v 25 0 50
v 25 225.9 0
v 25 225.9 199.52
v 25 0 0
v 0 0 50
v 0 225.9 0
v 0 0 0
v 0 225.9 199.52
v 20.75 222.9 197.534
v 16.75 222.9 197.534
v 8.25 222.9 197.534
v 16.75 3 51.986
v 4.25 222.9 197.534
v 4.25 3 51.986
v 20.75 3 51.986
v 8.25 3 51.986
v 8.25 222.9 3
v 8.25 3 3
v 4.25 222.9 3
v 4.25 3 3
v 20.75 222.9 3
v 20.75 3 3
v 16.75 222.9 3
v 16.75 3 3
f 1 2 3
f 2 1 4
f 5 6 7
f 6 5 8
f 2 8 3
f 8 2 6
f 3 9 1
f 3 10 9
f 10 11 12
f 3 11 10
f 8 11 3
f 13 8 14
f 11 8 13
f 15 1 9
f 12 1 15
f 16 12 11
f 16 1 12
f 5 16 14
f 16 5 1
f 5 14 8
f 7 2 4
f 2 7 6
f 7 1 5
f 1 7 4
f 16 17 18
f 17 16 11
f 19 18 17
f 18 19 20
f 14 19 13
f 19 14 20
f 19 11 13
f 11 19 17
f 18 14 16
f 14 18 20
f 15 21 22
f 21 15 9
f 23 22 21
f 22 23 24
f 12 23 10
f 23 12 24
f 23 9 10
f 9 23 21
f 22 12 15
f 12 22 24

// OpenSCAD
//Mail Stamps

paperSize = 215.9;
buffer = 2;
thickness = 3;

module prism(){
    difference(){
        cube([25, paperSize + 2*buffer + 2*thickness, 150]);
        
        rotate([33.5, 0, 0])
        cube([25, 300, 150]);
    }
}

module holder(){
    difference(){
        
        union(){
            translate([0, 0, 50])
            prism();
            
            cube([25, paperSize + 2*buffer + 2*thickness, 50]);
        }
        
        union(){
            for (i = [0:1]){
                translate([25/4 - 2 + 25/2 * i, thickness, thickness])
                cube([4, paperSize + 2*buffer, 300]);
            }
        }
    }
}


module main(){
    holder();
}main();
